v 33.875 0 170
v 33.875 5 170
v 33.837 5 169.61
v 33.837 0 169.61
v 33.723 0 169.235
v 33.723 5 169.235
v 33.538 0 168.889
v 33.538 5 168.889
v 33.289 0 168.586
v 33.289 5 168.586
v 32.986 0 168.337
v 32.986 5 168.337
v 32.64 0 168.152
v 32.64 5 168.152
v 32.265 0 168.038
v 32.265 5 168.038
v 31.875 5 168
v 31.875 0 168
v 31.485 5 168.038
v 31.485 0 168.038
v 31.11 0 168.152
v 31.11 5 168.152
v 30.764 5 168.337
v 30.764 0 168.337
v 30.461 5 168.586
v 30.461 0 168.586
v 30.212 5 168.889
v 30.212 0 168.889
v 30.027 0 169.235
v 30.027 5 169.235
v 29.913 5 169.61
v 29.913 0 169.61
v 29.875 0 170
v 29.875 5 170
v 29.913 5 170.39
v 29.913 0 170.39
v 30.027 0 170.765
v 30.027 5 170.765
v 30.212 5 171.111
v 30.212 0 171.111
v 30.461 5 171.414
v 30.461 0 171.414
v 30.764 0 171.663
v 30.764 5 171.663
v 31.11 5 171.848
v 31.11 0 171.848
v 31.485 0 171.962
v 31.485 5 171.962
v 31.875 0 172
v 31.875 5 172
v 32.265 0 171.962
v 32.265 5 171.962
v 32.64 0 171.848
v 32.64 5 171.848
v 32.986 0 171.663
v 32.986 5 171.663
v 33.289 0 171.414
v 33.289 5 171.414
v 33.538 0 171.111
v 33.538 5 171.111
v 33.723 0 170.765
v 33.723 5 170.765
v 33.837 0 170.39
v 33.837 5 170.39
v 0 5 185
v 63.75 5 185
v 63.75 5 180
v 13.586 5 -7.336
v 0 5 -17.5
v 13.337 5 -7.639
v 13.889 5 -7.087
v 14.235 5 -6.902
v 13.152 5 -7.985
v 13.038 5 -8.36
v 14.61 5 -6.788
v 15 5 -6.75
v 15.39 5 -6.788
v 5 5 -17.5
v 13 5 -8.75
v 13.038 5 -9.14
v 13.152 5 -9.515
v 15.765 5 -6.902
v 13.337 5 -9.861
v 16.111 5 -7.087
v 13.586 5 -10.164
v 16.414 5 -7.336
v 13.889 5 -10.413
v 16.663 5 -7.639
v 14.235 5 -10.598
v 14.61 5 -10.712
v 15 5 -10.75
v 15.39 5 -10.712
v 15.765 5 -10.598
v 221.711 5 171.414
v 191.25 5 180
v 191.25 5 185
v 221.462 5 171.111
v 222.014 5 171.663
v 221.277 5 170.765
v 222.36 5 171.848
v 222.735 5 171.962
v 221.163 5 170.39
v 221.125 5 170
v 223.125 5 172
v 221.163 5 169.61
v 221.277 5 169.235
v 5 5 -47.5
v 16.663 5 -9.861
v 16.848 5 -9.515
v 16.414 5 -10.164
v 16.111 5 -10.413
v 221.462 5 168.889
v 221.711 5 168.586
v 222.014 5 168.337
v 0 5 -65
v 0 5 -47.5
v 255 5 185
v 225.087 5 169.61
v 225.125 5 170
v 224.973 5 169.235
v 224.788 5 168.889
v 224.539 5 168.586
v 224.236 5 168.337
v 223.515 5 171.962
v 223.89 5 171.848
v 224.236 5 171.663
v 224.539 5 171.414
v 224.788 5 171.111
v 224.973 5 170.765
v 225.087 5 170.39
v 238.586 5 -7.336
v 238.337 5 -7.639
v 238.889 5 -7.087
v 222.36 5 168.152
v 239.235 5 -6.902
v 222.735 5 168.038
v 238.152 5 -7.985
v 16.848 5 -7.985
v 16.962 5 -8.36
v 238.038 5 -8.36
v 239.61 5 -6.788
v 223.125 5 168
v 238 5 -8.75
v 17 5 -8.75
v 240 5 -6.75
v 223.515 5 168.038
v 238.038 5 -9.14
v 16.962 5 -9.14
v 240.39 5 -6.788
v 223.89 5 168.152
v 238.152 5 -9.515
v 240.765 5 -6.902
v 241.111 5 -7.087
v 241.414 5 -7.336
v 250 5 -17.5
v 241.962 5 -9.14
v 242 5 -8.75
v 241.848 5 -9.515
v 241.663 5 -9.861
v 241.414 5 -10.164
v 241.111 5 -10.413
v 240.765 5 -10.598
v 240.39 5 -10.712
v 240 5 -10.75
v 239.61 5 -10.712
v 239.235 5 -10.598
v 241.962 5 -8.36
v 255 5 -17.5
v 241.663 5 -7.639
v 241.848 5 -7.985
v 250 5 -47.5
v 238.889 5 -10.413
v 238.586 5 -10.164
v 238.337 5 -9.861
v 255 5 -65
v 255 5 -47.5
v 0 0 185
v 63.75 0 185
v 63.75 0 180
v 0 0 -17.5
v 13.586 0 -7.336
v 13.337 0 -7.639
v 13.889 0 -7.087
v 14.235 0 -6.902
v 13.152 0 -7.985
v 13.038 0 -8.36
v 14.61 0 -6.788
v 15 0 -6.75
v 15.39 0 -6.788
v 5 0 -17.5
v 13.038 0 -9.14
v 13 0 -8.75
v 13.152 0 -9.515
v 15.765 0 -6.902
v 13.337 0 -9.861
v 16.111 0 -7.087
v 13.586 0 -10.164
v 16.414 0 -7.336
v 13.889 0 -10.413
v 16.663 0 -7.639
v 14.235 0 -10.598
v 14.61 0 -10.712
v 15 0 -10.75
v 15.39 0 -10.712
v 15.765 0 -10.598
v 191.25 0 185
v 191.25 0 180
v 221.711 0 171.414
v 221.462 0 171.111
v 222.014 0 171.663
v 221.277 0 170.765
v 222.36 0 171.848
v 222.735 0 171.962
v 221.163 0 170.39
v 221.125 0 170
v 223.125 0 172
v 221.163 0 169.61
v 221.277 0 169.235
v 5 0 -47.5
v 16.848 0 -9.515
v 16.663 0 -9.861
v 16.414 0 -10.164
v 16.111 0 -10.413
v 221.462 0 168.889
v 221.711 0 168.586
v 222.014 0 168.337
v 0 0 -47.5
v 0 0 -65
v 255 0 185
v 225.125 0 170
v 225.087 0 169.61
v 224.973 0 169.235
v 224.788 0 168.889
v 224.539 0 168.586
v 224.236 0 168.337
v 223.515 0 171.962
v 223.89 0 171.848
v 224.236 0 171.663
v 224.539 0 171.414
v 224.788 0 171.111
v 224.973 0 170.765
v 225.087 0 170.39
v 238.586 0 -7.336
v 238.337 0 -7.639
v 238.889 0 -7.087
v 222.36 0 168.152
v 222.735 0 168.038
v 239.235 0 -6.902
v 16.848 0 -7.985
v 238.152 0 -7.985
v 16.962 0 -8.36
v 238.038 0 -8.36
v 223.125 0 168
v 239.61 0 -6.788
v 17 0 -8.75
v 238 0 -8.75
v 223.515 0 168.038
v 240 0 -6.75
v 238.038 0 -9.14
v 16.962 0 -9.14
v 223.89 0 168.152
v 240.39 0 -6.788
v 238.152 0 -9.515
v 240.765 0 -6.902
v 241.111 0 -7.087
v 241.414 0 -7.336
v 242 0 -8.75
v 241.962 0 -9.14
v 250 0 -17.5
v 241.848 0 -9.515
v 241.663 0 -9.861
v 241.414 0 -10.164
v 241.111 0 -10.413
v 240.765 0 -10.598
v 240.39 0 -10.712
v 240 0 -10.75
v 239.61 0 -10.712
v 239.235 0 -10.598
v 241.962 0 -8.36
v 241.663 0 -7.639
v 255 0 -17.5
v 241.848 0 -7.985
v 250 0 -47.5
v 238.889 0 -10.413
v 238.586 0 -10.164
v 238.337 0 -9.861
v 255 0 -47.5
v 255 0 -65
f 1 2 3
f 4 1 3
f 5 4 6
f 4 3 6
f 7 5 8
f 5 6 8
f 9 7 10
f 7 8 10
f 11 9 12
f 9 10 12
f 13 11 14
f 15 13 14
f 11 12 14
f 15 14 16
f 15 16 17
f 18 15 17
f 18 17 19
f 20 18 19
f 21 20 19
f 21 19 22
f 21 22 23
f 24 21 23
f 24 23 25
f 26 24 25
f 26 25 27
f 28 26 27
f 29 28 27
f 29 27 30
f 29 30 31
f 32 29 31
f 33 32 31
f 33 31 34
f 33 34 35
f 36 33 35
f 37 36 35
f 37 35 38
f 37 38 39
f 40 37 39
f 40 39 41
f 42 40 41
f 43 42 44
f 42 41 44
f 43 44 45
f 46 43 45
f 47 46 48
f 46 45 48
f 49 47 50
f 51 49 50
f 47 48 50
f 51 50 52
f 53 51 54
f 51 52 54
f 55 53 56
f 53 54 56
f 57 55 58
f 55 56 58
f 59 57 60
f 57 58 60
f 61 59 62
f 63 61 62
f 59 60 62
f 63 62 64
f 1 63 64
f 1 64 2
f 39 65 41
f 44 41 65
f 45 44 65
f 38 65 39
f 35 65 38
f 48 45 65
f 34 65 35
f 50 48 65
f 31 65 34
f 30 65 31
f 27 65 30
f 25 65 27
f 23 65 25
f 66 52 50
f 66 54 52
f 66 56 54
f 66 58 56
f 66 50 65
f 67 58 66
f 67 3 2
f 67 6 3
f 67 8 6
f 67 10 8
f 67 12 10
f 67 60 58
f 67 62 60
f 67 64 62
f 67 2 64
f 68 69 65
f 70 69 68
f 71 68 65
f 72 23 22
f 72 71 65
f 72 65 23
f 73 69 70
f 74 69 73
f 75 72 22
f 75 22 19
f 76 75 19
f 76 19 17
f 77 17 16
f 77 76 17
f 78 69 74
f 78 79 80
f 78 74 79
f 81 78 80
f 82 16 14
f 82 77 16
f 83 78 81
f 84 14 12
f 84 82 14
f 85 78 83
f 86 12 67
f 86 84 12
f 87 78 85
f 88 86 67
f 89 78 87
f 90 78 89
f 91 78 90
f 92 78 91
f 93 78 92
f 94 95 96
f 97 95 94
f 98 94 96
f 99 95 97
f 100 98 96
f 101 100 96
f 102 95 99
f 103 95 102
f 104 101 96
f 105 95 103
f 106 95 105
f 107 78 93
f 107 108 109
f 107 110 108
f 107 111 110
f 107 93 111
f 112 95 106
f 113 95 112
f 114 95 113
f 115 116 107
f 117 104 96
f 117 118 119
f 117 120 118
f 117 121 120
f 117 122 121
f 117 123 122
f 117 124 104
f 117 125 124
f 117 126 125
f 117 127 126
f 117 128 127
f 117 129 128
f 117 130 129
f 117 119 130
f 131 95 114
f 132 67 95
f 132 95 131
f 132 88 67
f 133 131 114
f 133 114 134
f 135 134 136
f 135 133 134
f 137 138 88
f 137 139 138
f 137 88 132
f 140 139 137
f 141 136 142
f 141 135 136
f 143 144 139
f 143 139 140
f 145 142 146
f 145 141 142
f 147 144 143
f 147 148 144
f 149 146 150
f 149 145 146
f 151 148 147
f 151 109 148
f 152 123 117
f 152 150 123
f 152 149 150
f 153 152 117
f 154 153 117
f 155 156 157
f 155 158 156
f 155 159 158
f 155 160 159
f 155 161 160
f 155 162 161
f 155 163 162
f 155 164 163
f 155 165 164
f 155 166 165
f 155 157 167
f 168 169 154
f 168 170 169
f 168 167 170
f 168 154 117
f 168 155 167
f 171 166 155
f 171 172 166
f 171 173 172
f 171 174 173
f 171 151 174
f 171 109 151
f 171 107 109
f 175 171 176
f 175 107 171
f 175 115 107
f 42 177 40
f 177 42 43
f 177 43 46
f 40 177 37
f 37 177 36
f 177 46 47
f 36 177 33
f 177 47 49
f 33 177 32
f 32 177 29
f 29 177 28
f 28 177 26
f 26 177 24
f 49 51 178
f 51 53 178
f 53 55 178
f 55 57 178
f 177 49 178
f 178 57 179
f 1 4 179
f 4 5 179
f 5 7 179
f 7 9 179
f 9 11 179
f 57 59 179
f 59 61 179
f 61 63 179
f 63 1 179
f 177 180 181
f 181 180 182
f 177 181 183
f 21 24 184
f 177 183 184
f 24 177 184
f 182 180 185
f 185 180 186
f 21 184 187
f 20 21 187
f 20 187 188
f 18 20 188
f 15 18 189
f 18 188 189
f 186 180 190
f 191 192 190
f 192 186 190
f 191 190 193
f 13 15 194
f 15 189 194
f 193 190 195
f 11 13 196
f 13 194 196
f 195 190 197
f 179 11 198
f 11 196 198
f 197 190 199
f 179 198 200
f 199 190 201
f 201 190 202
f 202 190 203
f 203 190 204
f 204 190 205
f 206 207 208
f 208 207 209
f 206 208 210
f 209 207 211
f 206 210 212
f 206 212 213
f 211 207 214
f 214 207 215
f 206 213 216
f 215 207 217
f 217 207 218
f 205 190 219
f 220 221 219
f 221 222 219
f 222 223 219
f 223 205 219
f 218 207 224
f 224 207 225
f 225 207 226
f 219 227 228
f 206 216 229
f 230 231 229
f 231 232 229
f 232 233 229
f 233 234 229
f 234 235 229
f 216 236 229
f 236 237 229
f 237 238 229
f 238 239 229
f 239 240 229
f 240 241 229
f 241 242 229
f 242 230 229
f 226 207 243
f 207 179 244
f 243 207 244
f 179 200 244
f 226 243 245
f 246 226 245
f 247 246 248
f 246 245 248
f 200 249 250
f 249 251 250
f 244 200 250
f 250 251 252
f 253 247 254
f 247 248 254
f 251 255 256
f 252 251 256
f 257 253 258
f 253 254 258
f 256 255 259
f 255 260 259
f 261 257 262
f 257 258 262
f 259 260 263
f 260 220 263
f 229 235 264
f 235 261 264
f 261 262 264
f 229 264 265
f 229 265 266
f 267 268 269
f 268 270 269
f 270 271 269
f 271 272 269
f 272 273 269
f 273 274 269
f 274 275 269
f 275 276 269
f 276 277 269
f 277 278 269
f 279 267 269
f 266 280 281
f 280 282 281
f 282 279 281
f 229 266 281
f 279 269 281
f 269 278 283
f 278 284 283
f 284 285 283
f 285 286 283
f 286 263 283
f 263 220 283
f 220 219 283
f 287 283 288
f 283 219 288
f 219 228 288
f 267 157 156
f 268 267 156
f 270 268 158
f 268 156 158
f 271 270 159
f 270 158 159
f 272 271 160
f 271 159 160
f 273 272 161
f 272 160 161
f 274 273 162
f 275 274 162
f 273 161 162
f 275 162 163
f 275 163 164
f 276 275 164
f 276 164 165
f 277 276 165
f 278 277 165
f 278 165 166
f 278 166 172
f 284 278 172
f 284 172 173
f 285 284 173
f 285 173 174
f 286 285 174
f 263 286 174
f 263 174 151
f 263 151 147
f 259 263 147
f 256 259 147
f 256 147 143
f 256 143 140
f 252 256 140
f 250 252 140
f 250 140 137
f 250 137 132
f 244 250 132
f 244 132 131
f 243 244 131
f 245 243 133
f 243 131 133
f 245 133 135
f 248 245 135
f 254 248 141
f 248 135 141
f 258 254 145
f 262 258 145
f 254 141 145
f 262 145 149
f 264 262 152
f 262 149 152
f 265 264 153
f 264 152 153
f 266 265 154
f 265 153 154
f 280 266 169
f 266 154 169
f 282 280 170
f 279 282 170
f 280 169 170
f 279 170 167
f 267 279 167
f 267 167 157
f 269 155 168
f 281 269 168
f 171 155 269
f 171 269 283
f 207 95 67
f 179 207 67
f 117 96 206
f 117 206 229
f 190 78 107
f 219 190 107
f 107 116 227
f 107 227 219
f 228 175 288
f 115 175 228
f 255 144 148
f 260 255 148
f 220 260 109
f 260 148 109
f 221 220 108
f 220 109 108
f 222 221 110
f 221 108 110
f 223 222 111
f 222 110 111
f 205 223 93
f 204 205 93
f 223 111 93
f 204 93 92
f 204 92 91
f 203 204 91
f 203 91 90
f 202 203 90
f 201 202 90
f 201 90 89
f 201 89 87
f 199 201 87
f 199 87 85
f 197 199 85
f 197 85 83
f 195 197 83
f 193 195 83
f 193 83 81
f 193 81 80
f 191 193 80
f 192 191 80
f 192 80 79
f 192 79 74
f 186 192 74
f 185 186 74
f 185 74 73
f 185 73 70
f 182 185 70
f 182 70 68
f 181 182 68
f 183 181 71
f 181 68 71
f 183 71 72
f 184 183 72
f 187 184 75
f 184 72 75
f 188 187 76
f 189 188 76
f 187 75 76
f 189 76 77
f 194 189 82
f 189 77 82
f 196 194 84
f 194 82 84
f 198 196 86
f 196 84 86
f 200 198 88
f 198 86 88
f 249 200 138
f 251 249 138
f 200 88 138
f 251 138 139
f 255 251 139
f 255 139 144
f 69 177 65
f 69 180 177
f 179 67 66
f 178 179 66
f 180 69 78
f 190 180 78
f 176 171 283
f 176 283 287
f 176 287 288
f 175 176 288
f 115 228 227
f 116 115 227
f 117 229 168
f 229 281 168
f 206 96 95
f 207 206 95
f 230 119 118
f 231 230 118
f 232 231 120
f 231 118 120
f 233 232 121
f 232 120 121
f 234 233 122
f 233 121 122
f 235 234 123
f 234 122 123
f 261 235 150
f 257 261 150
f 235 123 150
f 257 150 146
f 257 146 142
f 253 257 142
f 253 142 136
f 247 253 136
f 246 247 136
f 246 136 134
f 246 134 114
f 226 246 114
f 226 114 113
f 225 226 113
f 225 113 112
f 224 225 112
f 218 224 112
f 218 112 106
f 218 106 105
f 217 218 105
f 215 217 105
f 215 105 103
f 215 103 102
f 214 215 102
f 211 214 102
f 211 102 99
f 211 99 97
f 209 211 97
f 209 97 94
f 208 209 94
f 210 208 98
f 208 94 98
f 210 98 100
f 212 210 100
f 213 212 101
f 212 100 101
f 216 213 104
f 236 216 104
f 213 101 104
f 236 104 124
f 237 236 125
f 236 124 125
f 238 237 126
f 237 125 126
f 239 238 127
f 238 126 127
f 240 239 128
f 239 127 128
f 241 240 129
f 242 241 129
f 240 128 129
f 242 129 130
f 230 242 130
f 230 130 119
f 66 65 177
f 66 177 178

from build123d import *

# Parameters (mm, degrees)
SKETCH2_W           = 255
SKETCH2_H           = 65
BOSS_EXTRUDE1_DEPTH = 5
SKETCH3_W           = 6
SKETCH3_H           = 65
BOSS_EXTRUDE2_DEPTH = 5
SKETCH3_3_W         = 5
SKETCH3_3_H         = 30
CUT_EXTRUDE1_DEPTH  = 10
SKETCH4_W           = 6
SKETCH4_H           = 65
CUT_EXTRUDE2_DEPTH  = 10
SKETCH6_W           = 255
SKETCH6_H           = 5
BOSS_EXTRUDE3_DEPTH = 185
CUT_EXTRUDE3_DEPTH  = 185
SKETCH9_R           = 1.5
CUT_EXTRUDE4_DEPTH  = 185
SKETCH10_R          = 1.5
CUT_EXTRUDE5_DEPTH  = 185
SKETCH11_R          = 2
CUT_EXTRUDE6_DEPTH  = 10


with BuildPart() as part:
    # Sketch2 → Boss-Extrude1 (new body)
    with BuildSketch(Plane(origin=(0, 0, 0), x_dir=(1, 0, 0), z_dir=(0, 1, 0))):
        with Locations((127.5, 32.5)):
            Rectangle(SKETCH2_W, SKETCH2_H)
    extrude(amount=BOSS_EXTRUDE1_DEPTH)

    # Sketch3 → Boss-Extrude2 (add)
    with BuildSketch(Plane(origin=(0, 5, 0), x_dir=(1, 0, 0), z_dir=(0, 1, 0))):
        Polygon((261, 65), (255, 65), (255, 47.5), (255, 17.5), (255, 0), (261, 0), align=None)
        with Locations((-3, 32.5)):
            Rectangle(SKETCH3_W, SKETCH3_H)
    extrude(amount=-BOSS_EXTRUDE2_DEPTH)

    # Sketch3<3> → Cut-Extrude1 (cut)
    with BuildSketch(Plane(origin=(0, 5, 0), x_dir=(1, 0, 0), z_dir=(0, 1, 0))):
        with Locations((252.5, 32.5)):
            Rectangle(SKETCH3_3_W, SKETCH3_3_H)
        with Locations((2.5, 32.5)):
            Rectangle(SKETCH3_3_W, SKETCH3_3_H)
    extrude(amount=-CUT_EXTRUDE1_DEPTH, mode=Mode.SUBTRACT)

    # Sketch4 → Cut-Extrude2 (cut)
    with BuildSketch(Plane.XZ):
        Polygon((255, -47.5), (255, -65), (261, -65), (261, 0), (255, 0), align=None)
        with Locations((-3, -32.5)):
            Rectangle(SKETCH4_W, SKETCH4_H)
    extrude(amount=-CUT_EXTRUDE2_DEPTH, mode=Mode.SUBTRACT)

    # Sketch6 → Boss-Extrude3 (add)
    with BuildSketch(Plane.XY):
        with Locations((127.5, 2.5)):
            Rectangle(SKETCH6_W, SKETCH6_H)
    extrude(amount=BOSS_EXTRUDE3_DEPTH)

    # Sketch8 → Cut-Extrude3 (cut)
    with BuildSketch(Plane(origin=(0, 5, 0), x_dir=(1, 0, 0), z_dir=(0, 1, 0))):
        Polygon((127.5, -185), (191.25, -185), (191.25, -180), (127.5, -180), (63.75, -180), (63.75, -185), align=None)
    extrude(amount=-CUT_EXTRUDE3_DEPTH, mode=Mode.SUBTRACT)

    # Sketch9 → Cut-Extrude4 (cut)
    with BuildSketch(Plane(origin=(0, 5, 0), x_dir=(1, 0, 0), z_dir=(0, 1, 0))):
        with Locations((223.125, -170)):
            Circle(SKETCH9_R)
        with Locations((31.875, -170)):
            Circle(SKETCH9_R)
    extrude(amount=-CUT_EXTRUDE4_DEPTH, mode=Mode.SUBTRACT)

    # Sketch10 → Cut-Extrude5 (cut)
    with BuildSketch(Plane(origin=(0, 5, 0), x_dir=(1, 0, 0), z_dir=(0, 1, 0))):
        with Locations((240, 8.75)):
            Circle(SKETCH10_R)
        with Locations((15, 8.75)):
            Circle(SKETCH10_R)
    extrude(amount=-CUT_EXTRUDE5_DEPTH, mode=Mode.SUBTRACT)

    # Sketch11 → Cut-Extrude6 (cut)
    with BuildSketch(Plane(origin=(0, 5, 0), x_dir=(1, 0, 0), z_dir=(0, 1, 0))):
        with Locations((240, 8.75)):
            Circle(SKETCH11_R)
        with Locations((15, 8.75)):
            Circle(SKETCH11_R)
        with Locations((31.875, -170)):
            Circle(SKETCH11_R)
        with Locations((223.125, -170)):
            Circle(SKETCH11_R)
    extrude(amount=-CUT_EXTRUDE6_DEPTH, mode=Mode.SUBTRACT)


solid = part.part
